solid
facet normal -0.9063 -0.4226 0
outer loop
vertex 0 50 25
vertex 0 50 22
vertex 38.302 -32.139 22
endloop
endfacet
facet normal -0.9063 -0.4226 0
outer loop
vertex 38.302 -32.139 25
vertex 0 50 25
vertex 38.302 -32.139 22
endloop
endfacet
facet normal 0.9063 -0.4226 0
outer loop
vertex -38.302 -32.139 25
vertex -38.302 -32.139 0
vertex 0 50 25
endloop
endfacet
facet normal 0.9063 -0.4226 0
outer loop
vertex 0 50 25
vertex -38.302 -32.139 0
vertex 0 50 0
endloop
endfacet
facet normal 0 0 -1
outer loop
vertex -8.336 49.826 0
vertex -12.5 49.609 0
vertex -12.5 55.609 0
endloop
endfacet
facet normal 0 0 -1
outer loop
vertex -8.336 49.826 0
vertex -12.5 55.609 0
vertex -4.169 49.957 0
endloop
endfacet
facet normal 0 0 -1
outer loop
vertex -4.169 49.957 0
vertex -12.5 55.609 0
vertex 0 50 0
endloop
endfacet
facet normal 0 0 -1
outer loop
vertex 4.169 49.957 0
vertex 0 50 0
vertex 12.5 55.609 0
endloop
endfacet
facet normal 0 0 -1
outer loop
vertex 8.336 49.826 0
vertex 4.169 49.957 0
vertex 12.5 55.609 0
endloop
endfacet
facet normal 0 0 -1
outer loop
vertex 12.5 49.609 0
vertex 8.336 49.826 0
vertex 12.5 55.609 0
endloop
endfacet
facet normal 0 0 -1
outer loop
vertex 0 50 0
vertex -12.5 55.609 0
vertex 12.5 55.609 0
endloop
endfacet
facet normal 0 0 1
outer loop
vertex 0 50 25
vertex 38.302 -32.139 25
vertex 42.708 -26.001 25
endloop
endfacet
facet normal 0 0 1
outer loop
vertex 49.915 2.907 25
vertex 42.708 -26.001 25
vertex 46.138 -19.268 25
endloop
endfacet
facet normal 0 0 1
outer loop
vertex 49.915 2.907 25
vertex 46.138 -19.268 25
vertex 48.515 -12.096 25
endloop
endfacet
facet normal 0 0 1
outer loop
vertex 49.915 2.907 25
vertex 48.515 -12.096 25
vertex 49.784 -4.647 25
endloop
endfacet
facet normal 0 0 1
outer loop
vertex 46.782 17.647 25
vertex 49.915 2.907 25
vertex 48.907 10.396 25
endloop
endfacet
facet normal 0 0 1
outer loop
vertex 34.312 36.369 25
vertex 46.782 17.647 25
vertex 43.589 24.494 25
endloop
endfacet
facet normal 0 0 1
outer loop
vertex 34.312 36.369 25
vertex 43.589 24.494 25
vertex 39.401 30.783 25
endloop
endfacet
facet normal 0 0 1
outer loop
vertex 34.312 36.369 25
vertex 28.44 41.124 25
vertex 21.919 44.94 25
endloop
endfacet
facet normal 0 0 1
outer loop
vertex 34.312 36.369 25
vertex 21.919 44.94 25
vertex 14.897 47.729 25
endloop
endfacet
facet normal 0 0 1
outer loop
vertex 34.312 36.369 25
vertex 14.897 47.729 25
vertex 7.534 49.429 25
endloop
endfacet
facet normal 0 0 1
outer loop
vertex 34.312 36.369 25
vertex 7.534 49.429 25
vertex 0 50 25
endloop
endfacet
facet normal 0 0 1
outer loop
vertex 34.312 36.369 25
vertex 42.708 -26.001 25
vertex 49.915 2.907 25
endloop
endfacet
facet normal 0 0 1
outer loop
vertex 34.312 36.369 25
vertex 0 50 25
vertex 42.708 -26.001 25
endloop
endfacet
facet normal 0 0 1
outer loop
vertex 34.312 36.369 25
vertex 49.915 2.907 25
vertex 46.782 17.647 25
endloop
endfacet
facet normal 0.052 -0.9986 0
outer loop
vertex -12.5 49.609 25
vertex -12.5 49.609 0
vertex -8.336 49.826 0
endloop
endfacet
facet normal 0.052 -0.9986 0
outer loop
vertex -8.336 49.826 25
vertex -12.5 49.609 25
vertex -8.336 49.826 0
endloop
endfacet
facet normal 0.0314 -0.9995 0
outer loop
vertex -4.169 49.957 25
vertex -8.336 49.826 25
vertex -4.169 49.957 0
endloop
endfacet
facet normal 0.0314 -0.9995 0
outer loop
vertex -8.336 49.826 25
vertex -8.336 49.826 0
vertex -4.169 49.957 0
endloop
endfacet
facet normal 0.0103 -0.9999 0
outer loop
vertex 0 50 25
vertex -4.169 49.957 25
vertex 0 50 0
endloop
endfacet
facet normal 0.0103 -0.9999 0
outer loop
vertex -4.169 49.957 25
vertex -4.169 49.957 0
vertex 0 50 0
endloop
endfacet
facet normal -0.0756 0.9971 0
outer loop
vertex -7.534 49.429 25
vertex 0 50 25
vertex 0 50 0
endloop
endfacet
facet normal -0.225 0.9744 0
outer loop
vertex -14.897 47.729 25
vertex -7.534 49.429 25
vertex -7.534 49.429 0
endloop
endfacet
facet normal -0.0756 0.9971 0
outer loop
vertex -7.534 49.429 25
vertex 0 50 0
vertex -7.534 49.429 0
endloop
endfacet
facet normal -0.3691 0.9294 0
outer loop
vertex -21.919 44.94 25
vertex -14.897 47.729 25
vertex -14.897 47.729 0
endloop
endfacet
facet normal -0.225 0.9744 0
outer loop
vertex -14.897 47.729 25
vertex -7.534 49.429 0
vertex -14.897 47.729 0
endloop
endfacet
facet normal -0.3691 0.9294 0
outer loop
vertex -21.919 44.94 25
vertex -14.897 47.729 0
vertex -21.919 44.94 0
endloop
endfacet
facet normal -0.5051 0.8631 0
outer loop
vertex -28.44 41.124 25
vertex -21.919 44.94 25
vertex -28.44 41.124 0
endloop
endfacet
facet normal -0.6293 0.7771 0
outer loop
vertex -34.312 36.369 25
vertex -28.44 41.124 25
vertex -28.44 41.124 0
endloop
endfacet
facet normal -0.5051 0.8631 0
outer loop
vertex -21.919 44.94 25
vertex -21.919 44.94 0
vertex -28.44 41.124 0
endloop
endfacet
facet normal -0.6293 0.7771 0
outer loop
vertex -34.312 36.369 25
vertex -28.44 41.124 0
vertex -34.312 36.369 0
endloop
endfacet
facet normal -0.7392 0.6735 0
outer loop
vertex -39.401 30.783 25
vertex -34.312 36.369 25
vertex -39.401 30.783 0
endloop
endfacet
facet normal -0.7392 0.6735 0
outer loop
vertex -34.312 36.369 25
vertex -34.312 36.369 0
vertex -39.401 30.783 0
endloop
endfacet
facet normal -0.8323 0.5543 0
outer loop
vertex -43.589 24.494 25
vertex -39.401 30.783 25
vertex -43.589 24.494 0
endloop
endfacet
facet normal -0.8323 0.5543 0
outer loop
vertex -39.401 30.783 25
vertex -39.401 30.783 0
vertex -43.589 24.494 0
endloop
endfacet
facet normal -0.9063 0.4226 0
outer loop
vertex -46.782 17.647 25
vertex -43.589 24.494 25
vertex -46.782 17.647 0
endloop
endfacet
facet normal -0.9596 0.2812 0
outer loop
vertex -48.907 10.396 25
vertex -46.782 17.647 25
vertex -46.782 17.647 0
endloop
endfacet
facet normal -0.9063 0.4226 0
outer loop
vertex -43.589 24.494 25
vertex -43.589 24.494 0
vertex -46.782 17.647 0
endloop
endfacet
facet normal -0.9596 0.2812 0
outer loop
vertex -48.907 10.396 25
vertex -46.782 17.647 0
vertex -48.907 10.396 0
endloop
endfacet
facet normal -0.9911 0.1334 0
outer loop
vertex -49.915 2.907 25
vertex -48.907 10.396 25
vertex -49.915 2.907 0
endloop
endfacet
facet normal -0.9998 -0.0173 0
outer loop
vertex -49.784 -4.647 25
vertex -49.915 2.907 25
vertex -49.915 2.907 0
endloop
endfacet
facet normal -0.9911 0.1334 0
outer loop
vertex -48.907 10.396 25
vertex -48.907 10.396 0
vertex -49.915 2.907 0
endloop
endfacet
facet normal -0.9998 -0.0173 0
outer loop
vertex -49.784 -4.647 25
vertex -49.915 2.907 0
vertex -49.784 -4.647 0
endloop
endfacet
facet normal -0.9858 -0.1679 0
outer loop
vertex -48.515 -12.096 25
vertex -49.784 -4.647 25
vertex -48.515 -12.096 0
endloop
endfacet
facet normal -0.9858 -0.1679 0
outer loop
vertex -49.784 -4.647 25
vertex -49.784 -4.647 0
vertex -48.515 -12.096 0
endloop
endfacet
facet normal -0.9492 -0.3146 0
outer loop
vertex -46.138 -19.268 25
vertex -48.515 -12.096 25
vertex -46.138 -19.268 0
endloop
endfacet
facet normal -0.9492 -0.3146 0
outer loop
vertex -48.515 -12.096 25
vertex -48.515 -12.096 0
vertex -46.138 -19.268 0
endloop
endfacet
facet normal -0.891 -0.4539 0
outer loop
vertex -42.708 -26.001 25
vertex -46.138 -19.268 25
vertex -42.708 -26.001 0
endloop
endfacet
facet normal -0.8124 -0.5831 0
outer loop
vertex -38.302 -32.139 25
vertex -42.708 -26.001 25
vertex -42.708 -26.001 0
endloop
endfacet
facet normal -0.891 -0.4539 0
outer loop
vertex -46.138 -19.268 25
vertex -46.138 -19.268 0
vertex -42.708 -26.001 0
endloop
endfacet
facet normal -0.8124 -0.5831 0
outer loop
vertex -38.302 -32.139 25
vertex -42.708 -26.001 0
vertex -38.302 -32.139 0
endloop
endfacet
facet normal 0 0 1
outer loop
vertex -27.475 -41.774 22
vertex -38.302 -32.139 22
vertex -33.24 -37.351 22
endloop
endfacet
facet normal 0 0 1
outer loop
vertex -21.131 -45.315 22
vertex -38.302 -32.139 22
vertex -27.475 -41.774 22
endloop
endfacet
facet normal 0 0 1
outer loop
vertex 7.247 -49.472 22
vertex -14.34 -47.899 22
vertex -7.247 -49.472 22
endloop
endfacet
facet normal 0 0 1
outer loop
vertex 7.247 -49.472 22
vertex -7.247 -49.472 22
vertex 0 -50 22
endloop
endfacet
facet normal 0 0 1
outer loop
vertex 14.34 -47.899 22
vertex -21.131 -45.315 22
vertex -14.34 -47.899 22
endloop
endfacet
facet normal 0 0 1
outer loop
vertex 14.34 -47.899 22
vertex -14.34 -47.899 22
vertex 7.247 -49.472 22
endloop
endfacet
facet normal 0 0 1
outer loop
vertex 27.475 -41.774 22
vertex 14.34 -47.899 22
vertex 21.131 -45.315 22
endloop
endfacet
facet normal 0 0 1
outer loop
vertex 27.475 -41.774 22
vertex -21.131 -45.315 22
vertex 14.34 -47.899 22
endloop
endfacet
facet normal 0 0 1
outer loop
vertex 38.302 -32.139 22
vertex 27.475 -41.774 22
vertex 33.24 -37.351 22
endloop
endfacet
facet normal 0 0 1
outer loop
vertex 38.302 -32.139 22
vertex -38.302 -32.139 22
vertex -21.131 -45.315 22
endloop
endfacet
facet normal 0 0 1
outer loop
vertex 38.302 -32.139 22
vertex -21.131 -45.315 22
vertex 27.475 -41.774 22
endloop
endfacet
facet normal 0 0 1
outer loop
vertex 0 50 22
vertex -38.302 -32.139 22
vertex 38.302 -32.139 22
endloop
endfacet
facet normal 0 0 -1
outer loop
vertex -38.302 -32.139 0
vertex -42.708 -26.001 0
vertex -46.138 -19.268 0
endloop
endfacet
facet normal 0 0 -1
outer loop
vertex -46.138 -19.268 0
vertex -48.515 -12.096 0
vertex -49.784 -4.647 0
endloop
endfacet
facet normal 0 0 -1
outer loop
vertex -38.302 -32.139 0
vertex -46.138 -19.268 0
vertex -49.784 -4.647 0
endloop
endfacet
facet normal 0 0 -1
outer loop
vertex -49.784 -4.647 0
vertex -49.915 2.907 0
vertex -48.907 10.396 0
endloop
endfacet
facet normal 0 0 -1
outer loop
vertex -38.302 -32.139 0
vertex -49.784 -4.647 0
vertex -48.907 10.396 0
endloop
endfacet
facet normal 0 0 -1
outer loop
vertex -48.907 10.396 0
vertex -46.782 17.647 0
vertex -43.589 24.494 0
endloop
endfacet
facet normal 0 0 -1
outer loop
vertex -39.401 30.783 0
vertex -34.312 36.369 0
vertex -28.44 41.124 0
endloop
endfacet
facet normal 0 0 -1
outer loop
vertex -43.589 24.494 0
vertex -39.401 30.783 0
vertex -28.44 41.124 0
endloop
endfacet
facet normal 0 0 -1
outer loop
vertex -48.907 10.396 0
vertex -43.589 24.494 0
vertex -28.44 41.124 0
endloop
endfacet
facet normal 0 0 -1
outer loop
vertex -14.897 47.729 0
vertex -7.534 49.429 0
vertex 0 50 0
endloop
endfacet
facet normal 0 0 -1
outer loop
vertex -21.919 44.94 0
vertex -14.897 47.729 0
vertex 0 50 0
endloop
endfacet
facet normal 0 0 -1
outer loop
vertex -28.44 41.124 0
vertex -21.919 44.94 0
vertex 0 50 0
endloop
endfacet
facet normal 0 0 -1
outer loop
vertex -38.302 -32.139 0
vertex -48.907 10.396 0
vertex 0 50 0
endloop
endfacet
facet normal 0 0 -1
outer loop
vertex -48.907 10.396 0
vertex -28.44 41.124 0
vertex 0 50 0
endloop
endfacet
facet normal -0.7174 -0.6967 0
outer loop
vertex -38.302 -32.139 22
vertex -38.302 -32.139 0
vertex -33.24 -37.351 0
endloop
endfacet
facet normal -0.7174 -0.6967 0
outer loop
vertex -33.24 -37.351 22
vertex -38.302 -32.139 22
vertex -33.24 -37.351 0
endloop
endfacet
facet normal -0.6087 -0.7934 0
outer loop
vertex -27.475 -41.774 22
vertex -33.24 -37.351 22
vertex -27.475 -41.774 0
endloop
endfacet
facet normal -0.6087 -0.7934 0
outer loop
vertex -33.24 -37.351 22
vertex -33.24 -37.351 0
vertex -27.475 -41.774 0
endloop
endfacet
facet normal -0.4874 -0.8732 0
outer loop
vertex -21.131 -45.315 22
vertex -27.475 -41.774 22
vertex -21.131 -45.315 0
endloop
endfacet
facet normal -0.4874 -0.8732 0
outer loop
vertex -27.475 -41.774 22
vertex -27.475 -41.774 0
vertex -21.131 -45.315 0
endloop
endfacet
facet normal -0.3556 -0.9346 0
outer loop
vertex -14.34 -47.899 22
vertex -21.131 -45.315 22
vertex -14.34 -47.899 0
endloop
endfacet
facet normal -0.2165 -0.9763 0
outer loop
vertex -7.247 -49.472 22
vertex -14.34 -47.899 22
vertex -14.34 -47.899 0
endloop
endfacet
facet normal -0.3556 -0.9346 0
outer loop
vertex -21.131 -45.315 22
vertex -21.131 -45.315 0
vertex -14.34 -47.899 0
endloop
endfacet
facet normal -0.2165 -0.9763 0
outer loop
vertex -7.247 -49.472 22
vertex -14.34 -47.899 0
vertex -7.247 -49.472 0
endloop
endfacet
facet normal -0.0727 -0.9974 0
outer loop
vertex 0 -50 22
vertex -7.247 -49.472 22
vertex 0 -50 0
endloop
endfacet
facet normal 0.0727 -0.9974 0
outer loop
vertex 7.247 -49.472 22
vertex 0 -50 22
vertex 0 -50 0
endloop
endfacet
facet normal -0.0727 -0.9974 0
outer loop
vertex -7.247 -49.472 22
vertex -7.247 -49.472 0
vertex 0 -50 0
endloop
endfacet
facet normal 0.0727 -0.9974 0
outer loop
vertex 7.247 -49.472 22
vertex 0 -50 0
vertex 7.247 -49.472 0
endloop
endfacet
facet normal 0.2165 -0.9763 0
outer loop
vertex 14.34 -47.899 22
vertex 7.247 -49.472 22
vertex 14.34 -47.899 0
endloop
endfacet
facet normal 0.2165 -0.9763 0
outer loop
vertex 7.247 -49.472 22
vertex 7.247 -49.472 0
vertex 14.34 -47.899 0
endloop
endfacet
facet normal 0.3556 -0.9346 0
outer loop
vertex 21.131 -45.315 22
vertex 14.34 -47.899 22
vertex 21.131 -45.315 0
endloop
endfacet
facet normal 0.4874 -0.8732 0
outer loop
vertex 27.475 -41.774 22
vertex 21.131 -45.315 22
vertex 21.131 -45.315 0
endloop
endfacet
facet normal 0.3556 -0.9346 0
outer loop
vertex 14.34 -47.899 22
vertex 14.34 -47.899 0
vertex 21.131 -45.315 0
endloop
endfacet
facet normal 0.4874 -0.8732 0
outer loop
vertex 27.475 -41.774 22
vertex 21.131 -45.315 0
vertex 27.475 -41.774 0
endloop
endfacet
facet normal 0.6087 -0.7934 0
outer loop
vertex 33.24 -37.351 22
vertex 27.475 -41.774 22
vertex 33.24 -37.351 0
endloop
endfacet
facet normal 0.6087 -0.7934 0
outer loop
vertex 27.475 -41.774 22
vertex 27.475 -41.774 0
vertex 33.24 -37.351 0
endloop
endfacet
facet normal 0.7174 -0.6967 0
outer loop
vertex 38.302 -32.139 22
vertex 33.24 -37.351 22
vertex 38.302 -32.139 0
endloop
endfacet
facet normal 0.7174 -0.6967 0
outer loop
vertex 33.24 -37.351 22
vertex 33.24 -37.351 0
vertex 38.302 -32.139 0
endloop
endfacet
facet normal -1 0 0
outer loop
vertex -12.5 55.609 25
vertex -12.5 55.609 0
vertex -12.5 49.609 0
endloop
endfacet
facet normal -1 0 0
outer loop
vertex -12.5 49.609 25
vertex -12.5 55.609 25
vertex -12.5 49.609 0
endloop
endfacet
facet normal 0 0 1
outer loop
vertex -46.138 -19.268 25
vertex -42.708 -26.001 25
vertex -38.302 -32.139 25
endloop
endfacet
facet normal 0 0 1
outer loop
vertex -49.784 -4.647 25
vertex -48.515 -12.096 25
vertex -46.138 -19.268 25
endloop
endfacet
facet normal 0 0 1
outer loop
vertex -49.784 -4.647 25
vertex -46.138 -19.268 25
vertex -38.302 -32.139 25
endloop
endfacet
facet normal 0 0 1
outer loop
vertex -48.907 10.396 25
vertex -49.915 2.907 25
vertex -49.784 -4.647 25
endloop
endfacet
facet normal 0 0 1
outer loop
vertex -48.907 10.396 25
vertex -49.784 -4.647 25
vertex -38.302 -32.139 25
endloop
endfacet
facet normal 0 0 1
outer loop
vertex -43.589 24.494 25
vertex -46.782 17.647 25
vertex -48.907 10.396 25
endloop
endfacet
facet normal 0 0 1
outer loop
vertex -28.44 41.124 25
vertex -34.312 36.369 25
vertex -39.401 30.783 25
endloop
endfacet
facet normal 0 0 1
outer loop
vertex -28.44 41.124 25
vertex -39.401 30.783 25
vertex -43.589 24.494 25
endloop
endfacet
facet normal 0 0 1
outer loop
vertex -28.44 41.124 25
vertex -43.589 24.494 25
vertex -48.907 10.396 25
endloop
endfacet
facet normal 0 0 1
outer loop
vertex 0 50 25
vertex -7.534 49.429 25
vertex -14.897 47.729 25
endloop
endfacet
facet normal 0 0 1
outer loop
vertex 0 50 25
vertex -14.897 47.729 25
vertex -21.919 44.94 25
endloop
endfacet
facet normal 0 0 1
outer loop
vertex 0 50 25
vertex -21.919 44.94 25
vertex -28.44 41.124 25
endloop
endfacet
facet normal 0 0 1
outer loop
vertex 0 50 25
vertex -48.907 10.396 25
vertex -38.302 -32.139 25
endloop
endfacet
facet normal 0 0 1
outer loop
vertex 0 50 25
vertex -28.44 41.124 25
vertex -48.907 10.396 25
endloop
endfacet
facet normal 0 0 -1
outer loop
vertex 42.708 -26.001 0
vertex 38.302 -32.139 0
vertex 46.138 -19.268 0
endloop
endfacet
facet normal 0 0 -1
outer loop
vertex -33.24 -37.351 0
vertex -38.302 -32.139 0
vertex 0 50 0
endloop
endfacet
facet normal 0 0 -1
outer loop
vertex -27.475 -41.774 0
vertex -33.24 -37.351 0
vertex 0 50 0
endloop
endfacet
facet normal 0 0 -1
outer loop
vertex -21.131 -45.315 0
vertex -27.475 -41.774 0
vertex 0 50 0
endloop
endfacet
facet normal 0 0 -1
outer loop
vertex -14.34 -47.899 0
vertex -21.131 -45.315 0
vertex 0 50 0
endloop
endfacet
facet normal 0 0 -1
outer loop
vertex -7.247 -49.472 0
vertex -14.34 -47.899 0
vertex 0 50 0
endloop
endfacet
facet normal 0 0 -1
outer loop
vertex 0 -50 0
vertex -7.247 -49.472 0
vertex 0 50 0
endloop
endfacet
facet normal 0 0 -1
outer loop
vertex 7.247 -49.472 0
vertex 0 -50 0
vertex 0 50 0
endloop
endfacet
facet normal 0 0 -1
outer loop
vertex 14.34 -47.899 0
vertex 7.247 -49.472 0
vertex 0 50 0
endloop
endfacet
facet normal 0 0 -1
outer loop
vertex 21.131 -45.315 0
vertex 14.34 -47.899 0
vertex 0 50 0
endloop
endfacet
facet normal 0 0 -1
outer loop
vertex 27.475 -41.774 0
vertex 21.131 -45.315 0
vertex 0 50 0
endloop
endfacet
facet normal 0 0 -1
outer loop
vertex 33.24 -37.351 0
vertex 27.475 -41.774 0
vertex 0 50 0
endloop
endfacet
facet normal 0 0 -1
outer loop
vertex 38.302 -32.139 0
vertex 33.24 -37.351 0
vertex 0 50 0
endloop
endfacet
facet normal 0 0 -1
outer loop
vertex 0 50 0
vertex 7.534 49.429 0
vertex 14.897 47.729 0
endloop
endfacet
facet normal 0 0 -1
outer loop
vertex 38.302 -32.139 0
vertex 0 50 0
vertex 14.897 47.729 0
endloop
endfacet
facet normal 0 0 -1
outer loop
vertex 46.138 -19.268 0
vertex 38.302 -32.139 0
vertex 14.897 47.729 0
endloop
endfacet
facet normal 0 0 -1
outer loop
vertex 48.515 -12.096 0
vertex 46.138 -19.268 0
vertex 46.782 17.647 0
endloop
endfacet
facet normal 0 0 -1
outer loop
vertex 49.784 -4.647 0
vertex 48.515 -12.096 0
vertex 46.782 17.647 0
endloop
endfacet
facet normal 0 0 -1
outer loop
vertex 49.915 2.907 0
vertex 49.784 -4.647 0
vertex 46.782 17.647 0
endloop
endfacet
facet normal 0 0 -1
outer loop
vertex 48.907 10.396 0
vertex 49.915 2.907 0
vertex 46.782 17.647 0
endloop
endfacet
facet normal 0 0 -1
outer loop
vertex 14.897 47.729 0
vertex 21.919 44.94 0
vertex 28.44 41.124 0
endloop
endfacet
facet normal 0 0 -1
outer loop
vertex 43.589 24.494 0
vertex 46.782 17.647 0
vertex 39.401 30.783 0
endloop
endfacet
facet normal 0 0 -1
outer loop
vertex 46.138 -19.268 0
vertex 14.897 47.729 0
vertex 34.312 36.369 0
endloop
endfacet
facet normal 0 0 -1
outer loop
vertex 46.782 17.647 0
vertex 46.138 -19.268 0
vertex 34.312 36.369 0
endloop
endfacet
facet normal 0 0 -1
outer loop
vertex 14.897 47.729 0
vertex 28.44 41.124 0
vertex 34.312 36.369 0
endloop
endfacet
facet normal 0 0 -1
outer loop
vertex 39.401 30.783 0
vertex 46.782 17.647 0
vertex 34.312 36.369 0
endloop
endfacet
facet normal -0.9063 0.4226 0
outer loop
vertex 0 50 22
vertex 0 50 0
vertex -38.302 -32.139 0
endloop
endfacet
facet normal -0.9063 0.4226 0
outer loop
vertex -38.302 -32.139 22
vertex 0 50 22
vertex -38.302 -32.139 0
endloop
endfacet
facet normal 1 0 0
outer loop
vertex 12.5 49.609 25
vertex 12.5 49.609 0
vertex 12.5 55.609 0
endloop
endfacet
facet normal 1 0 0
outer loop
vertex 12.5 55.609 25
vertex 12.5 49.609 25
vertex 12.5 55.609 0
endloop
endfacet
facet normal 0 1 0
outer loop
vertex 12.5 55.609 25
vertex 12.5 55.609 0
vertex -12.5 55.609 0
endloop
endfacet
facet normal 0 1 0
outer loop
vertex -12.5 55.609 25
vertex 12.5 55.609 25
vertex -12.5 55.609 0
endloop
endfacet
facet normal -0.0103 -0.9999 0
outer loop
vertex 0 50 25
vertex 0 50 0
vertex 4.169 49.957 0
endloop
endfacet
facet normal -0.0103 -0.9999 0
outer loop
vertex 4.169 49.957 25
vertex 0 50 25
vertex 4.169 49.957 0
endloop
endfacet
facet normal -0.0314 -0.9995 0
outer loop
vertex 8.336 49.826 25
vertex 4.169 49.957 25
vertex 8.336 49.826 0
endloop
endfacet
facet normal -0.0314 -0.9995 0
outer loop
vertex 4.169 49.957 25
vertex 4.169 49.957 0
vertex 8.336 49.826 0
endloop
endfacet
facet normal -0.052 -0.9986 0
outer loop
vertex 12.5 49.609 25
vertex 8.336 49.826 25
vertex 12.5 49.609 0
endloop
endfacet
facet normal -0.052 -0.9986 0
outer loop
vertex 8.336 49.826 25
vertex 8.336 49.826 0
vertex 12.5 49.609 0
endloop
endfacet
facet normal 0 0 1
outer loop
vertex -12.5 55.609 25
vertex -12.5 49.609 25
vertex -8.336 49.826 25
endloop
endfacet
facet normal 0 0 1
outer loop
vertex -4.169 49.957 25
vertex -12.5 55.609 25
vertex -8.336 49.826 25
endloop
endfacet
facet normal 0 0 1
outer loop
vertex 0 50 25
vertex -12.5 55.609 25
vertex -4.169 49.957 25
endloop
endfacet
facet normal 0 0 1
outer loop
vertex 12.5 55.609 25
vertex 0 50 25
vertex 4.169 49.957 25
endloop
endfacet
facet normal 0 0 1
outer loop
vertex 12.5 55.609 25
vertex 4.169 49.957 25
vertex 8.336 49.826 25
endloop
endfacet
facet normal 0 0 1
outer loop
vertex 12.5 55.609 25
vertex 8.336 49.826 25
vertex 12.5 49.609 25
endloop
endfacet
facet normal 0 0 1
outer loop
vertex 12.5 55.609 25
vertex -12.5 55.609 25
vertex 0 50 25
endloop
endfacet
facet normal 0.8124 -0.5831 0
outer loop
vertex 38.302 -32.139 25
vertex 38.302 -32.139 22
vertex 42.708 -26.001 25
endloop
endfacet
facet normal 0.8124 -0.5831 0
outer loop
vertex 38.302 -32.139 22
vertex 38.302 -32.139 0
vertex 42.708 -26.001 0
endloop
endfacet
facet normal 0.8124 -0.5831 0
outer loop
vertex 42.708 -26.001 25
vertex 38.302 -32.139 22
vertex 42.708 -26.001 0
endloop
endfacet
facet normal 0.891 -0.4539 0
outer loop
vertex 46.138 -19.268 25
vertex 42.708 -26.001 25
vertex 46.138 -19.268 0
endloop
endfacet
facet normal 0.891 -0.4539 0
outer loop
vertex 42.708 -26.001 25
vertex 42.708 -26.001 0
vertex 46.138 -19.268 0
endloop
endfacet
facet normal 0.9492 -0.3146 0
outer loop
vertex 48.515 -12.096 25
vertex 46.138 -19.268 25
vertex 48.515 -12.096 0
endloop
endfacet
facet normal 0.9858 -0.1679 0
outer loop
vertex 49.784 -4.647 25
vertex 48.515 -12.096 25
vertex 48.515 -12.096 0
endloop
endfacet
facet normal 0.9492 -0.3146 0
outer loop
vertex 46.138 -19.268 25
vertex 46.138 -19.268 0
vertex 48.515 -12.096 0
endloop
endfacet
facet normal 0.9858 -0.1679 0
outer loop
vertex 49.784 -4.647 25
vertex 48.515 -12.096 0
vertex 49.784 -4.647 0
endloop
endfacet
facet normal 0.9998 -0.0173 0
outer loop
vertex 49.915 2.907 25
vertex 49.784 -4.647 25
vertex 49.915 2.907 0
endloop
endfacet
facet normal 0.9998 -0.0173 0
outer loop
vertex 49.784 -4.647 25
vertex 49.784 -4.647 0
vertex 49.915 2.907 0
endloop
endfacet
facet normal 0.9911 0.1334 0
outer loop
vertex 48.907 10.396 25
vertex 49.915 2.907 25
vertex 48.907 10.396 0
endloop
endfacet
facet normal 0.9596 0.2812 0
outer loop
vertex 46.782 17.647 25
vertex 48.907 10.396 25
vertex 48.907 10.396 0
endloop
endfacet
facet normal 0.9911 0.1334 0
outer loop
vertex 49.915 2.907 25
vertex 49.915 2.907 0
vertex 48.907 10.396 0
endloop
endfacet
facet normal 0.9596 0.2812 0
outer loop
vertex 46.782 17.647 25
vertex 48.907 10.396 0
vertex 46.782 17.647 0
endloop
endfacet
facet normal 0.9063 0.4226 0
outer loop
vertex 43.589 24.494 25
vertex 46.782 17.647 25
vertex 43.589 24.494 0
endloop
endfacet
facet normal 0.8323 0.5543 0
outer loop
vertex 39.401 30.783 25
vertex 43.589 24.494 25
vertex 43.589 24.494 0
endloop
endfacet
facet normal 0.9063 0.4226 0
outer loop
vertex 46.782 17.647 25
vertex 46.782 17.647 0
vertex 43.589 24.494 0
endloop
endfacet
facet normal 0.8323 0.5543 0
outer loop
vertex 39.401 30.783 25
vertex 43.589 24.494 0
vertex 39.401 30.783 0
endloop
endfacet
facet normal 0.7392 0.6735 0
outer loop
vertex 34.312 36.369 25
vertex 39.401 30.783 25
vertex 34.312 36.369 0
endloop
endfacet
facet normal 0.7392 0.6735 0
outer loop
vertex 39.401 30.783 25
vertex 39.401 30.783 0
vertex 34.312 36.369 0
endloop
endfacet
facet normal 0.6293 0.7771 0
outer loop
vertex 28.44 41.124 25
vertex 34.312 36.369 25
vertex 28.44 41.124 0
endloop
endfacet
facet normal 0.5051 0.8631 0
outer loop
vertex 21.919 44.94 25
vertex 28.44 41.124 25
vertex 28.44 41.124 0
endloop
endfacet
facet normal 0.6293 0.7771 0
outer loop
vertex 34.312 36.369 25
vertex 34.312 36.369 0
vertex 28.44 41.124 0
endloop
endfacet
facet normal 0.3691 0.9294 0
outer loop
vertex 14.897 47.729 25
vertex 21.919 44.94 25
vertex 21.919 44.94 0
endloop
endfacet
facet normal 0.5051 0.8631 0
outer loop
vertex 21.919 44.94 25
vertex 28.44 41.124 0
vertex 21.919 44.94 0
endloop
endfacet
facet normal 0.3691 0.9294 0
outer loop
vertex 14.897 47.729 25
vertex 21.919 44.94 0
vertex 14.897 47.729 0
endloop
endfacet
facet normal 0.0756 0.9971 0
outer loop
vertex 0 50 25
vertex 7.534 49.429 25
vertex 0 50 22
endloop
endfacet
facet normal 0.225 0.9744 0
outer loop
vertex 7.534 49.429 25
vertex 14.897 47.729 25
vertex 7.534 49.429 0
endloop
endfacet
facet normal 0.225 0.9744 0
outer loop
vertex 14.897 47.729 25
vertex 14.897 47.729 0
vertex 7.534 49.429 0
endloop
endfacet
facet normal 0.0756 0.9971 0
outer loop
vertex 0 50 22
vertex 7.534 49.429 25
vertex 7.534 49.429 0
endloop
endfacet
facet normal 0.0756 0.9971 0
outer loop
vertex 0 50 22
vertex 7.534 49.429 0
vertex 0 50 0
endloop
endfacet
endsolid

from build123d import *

# Parameters (mm, degrees)
F1_DEPTH = 25
F2_DEPTH = 22


with BuildPart() as f1:
    # F0 (on Top) → F1 (new body)
    with BuildSketch(Plane.XY):
        with BuildLine():
            Line((-38.3022221559, -32.1393804843), (0, 50))
            ThreePointArc((0, 50), (-45.3153893518, 21.130913087), (-38.3022221559, -32.1393804843))
        make_face()
    extrude(amount=F1_DEPTH)


with BuildPart() as f1b:
    # F0 (on Top) → F1, piece 2 (new body)
    with BuildSketch(Plane.XY):
        with BuildLine():
            ThreePointArc((38.3022221559, -32.1393804843), (46.9846310393, -17.1010071663), (50, 0))
            ThreePointArc((50, 0), (35.3553390593, 35.3553390593), (0, 50))
            Line((0, 50), (38.3022221559, -32.1393804843))
        make_face()
    extrude(amount=F1_DEPTH)

    # F0 (on Top) → F2 (join)
    with BuildSketch(Plane.XY):
        with BuildLine():
            Line((38.3022221559, -32.1393804843), (0, 50))
            Line((0, 50), (-38.3022221559, -32.1393804843))
            ThreePointArc((-38.3022221559, -32.1393804843), (0, -50), (38.3022221559, -32.1393804843))
        make_face()
    extrude(amount=F2_DEPTH)


with BuildPart() as f1c:
    # F0 (on Top) → F1, piece 3 (new body)
    with BuildSketch(Plane.XY):
        with BuildLine():
            ThreePointArc((-12.5, 49.6089927834), (-6.2530569853, 49.9022242956), (0, 50))
            ThreePointArc((0, 50), (6.2530569853, 49.9022242956), (12.5, 49.6089927834))
            Line((12.5, 49.6089927834), (12.5, 55.6089927834))
            Line((12.5, 55.6089927834), (-12.5, 55.6089927834))
            Line((-12.5, 55.6089927834), (-12.5, 49.6089927834))
        make_face()
    extrude(amount=F1_DEPTH)


solid = Compound([f1.part, f1b.part, f1c.part])
